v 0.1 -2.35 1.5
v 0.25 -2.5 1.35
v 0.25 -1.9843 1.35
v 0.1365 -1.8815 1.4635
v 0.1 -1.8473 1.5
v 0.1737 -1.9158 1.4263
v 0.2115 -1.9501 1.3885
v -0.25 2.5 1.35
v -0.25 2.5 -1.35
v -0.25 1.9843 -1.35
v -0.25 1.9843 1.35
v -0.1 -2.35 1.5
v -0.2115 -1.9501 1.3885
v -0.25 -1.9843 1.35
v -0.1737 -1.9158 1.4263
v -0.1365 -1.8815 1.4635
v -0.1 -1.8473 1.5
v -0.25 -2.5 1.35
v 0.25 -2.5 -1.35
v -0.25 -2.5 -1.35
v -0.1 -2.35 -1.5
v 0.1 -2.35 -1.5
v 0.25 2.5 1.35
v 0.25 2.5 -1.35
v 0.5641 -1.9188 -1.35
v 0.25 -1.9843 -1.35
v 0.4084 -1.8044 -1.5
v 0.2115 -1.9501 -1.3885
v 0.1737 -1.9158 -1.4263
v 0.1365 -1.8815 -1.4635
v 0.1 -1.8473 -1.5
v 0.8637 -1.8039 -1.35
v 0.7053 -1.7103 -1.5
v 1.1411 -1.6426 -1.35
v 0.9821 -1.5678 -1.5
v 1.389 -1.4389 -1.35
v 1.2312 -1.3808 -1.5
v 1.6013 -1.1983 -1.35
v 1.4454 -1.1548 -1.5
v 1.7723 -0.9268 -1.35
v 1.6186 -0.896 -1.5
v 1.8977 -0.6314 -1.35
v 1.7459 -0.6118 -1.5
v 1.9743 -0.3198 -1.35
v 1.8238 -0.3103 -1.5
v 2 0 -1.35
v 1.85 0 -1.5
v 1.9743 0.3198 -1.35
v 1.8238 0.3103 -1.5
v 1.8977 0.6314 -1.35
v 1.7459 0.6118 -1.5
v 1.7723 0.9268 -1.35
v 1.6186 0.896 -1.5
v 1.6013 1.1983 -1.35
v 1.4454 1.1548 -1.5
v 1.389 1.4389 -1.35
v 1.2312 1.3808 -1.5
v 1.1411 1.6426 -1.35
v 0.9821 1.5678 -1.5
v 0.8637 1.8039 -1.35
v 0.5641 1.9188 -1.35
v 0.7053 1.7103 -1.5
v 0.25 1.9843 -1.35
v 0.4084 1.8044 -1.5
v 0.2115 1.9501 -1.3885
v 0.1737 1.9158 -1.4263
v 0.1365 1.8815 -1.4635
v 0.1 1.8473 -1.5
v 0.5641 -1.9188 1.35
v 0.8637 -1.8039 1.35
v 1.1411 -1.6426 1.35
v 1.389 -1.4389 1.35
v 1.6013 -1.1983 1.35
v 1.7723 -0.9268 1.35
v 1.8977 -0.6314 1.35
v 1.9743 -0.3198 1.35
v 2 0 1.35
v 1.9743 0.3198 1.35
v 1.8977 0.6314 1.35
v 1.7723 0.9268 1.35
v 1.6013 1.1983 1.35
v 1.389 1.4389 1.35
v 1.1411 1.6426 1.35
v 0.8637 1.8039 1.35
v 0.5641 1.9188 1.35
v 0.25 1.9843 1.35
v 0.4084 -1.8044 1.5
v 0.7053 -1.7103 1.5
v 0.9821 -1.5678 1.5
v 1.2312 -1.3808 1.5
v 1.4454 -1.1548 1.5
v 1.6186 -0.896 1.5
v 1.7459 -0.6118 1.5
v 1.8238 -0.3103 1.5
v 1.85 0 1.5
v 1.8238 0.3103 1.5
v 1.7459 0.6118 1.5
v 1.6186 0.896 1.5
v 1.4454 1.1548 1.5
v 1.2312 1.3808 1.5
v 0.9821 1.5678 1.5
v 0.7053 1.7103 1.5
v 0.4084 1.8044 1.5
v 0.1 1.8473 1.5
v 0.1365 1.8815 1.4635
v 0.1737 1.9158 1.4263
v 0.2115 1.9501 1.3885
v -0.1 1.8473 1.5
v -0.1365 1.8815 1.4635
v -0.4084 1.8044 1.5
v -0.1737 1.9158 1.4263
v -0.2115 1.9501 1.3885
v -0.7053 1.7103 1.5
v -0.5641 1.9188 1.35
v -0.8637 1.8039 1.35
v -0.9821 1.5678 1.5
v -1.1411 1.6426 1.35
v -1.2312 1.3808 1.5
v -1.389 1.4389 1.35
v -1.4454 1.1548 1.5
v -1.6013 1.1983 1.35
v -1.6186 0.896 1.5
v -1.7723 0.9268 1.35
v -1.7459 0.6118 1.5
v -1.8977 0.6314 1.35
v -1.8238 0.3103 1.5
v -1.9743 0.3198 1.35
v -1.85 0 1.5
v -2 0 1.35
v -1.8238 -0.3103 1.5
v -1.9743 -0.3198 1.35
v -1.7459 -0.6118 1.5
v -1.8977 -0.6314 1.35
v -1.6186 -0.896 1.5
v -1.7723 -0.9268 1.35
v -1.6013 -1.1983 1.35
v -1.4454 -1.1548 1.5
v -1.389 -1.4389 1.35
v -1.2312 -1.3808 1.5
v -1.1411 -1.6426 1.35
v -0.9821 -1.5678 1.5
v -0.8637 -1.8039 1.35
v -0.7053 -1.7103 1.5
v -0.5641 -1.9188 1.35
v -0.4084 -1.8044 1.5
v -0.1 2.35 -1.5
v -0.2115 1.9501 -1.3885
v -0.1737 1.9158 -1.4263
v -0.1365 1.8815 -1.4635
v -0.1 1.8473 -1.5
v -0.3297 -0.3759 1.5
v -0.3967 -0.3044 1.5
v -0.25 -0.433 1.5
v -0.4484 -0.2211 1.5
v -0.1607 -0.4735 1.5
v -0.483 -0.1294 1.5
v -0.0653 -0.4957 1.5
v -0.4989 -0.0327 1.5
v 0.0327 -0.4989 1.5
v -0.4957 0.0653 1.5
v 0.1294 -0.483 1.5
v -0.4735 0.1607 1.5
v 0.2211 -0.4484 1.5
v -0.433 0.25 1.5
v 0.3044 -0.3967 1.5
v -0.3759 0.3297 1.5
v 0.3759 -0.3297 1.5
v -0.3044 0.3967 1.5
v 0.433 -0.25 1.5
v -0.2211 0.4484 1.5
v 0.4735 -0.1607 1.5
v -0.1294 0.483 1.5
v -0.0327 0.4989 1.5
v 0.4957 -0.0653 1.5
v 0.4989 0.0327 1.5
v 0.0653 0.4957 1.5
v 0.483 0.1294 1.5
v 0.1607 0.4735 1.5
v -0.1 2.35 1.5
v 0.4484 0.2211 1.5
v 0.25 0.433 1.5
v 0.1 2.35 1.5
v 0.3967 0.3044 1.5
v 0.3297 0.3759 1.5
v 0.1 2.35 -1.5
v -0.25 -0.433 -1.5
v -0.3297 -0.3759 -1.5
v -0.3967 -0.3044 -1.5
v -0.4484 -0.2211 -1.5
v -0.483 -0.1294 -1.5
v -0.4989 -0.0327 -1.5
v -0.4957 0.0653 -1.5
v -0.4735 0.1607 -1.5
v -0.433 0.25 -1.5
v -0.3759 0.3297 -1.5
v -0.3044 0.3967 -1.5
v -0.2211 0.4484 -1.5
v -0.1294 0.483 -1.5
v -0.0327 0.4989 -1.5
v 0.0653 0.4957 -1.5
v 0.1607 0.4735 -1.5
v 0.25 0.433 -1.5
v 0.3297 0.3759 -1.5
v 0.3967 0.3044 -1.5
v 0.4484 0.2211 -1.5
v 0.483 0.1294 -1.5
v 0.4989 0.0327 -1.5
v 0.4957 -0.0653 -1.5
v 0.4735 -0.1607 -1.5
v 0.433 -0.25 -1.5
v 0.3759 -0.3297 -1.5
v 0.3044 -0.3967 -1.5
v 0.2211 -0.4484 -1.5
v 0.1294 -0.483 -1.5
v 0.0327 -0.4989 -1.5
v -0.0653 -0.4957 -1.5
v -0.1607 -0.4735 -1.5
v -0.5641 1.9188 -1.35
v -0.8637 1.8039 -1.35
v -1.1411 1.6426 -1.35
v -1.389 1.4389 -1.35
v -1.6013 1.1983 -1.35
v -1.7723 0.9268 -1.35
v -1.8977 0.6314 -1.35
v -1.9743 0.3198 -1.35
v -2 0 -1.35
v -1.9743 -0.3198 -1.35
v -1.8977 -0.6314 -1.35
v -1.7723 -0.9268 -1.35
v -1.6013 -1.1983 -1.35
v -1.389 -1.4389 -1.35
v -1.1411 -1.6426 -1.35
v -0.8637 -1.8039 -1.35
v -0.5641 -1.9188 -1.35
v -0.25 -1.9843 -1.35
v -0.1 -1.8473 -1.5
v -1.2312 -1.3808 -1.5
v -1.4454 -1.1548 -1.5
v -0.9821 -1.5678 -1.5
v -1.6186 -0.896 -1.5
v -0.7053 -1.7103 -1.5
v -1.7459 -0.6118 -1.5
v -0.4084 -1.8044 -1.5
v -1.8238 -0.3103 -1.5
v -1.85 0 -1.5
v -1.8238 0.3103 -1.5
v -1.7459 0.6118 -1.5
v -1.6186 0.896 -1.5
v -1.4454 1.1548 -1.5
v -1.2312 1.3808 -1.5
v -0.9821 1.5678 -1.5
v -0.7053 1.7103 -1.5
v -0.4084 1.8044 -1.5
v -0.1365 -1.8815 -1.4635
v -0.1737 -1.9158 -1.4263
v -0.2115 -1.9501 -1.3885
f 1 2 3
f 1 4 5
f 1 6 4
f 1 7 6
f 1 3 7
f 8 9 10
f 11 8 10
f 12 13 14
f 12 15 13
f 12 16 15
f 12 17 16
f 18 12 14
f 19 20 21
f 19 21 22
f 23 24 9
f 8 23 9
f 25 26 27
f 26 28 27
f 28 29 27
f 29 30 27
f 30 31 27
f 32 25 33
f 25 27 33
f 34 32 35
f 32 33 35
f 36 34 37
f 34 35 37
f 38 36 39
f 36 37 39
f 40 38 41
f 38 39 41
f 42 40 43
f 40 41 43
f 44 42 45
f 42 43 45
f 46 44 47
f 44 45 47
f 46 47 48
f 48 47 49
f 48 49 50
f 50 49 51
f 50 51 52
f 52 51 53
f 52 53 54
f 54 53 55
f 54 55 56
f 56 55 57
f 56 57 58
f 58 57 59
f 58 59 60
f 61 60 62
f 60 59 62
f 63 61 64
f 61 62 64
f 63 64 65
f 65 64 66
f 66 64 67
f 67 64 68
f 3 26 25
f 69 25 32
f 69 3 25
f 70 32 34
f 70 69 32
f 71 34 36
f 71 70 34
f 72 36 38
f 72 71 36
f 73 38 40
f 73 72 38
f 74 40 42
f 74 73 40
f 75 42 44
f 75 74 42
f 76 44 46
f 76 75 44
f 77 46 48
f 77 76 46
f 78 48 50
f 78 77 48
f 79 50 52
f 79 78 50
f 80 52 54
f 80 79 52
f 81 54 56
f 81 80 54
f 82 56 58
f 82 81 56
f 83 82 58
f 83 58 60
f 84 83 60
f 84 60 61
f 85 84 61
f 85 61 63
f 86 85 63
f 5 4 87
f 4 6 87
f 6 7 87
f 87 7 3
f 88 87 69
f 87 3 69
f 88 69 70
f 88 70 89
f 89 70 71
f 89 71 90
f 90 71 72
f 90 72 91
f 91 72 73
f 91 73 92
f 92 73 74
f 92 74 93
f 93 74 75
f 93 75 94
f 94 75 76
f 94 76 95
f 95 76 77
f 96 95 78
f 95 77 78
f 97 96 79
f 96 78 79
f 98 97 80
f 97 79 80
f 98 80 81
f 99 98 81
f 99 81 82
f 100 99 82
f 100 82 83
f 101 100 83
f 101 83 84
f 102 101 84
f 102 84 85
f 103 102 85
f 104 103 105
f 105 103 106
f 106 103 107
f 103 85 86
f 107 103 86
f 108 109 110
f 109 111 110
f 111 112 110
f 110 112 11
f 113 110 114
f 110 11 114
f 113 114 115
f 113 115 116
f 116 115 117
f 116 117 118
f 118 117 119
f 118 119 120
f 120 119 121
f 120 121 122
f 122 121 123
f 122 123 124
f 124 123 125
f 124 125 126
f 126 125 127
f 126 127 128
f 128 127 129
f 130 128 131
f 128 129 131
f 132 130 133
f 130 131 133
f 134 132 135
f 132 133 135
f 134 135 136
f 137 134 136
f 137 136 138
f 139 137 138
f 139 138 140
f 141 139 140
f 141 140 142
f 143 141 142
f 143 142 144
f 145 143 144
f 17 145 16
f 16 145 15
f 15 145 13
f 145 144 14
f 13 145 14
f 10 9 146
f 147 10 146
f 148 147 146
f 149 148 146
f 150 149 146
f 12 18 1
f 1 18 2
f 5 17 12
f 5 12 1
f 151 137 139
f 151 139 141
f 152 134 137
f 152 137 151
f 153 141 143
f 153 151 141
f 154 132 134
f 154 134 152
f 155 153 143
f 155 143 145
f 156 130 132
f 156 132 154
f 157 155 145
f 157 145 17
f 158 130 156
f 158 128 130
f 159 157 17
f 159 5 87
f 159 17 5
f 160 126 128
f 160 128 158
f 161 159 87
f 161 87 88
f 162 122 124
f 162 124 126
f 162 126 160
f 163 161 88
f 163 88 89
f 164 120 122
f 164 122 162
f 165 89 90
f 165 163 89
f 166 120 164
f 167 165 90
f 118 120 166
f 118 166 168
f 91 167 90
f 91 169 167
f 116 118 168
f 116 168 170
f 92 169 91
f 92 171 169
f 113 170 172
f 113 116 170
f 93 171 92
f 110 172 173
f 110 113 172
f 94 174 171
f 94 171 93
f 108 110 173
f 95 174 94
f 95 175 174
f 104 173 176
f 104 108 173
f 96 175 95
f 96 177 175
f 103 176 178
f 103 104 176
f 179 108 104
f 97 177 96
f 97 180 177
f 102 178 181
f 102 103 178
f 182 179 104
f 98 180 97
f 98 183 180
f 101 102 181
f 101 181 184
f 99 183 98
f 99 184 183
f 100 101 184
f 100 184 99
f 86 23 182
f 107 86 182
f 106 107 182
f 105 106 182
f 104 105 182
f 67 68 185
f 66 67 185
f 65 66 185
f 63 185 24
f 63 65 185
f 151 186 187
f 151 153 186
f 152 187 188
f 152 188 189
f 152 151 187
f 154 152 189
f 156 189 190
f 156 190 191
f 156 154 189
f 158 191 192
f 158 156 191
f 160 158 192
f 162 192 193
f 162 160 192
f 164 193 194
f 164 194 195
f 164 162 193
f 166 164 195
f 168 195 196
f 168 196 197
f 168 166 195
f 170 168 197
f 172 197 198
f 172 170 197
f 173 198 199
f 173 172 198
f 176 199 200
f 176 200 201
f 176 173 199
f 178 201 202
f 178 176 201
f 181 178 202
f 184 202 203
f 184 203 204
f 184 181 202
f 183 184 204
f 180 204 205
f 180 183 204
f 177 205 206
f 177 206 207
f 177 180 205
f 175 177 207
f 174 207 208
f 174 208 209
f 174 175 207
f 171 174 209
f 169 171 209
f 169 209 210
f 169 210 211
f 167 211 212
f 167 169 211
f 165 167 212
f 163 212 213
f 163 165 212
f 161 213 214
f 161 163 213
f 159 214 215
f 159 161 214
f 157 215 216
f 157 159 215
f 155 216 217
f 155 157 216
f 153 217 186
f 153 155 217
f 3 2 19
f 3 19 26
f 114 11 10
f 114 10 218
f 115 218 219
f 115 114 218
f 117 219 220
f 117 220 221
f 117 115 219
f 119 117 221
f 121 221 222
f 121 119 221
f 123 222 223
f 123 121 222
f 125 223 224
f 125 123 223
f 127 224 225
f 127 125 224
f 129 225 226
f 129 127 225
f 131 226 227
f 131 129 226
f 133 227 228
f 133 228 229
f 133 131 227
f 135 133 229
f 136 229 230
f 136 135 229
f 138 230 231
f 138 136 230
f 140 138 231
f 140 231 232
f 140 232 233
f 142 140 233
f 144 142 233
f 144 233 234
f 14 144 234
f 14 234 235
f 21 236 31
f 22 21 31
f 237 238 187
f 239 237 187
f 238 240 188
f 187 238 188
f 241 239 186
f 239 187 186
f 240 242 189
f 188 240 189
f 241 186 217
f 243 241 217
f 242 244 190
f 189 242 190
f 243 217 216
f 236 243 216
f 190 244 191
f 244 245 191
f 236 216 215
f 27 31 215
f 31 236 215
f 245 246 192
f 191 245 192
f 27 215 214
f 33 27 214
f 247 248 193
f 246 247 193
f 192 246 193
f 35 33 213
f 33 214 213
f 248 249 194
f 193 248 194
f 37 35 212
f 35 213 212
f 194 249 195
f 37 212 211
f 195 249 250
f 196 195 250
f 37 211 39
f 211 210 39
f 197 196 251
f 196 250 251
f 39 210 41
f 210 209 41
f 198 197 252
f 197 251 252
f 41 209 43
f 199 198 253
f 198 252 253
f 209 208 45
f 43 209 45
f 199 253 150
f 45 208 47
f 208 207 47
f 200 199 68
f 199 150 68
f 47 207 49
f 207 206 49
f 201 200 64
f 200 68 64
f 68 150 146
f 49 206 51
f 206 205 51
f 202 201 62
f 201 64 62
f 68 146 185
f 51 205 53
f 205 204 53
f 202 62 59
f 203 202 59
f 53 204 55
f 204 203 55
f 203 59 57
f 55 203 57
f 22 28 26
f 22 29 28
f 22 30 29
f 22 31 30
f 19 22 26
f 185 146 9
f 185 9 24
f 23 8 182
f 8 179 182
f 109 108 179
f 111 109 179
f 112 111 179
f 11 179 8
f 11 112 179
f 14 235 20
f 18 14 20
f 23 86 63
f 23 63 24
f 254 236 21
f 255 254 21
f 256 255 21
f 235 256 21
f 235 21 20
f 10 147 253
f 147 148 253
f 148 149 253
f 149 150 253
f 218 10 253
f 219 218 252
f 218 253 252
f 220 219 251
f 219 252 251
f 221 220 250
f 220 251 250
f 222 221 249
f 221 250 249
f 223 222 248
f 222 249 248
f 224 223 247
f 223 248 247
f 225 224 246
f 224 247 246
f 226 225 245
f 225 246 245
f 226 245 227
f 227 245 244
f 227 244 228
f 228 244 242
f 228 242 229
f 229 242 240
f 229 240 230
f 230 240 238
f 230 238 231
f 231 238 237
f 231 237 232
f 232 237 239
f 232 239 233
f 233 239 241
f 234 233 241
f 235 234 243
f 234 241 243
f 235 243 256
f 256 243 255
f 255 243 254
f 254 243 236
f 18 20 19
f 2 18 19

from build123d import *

# Parameters (mm, degrees)
SKETCH1_R           = 0.5
BOSS_EXTRUDE1_DEPTH = 1.5
CHAMFER1_SIZE       = 0.15


with BuildPart() as part:
    # Sketch1 → Boss-Extrude1 (new, symmetric)
    with BuildSketch(Plane.XY):
        with BuildLine():
            Line((-0.25, -2.5), (0.25, -2.5))
            Line((0.25, -2.5), (0.25, -1.984313483))
            ThreePointArc((0.25, -1.984313483), (2, 0), (0.25, 1.984313483))
            Line((0.25, 1.984313483), (0.25, 2.5))
            Line((0.25, 2.5), (-0.25, 2.5))
            Line((-0.25, 2.5), (-0.25, 1.984313483))
            ThreePointArc((-0.25, 1.984313483), (-2, 0), (-0.25, -1.984313483))
            Line((-0.25, -1.984313483), (-0.25, -2.5))
        make_face()
        Circle(SKETCH1_R, mode=Mode.SUBTRACT)
    extrude(amount=BOSS_EXTRUDE1_DEPTH, both=True)

    # Chamfer1
    chamfer1_edges = [part.edges().sort_by_distance(p)[0] for p in [
        (-0.25, -2.242156742, -1.5),
        (0, -2.5, -1.5),
        (0.25, -2.242156742, -1.5),
        (2, 0, -1.5),
        (0.25, 2.242156742, -1.5),
        (0, 2.5, -1.5),
        (-0.25, 2.242156742, -1.5),
        (-2, 0, -1.5),
        (-0.25, 2.242156742, 1.5),
        (0, 2.5, 1.5),
        (0.25, 2.242156742, 1.5),
        (2, 0, 1.5),
        (0.25, -2.242156742, 1.5),
        (0, -2.5, 1.5),
        (-0.25, -2.242156742, 1.5),
        (-2, 0, 1.5),
    ]]
    chamfer(chamfer1_edges, length=CHAMFER1_SIZE)


solid = part.part
